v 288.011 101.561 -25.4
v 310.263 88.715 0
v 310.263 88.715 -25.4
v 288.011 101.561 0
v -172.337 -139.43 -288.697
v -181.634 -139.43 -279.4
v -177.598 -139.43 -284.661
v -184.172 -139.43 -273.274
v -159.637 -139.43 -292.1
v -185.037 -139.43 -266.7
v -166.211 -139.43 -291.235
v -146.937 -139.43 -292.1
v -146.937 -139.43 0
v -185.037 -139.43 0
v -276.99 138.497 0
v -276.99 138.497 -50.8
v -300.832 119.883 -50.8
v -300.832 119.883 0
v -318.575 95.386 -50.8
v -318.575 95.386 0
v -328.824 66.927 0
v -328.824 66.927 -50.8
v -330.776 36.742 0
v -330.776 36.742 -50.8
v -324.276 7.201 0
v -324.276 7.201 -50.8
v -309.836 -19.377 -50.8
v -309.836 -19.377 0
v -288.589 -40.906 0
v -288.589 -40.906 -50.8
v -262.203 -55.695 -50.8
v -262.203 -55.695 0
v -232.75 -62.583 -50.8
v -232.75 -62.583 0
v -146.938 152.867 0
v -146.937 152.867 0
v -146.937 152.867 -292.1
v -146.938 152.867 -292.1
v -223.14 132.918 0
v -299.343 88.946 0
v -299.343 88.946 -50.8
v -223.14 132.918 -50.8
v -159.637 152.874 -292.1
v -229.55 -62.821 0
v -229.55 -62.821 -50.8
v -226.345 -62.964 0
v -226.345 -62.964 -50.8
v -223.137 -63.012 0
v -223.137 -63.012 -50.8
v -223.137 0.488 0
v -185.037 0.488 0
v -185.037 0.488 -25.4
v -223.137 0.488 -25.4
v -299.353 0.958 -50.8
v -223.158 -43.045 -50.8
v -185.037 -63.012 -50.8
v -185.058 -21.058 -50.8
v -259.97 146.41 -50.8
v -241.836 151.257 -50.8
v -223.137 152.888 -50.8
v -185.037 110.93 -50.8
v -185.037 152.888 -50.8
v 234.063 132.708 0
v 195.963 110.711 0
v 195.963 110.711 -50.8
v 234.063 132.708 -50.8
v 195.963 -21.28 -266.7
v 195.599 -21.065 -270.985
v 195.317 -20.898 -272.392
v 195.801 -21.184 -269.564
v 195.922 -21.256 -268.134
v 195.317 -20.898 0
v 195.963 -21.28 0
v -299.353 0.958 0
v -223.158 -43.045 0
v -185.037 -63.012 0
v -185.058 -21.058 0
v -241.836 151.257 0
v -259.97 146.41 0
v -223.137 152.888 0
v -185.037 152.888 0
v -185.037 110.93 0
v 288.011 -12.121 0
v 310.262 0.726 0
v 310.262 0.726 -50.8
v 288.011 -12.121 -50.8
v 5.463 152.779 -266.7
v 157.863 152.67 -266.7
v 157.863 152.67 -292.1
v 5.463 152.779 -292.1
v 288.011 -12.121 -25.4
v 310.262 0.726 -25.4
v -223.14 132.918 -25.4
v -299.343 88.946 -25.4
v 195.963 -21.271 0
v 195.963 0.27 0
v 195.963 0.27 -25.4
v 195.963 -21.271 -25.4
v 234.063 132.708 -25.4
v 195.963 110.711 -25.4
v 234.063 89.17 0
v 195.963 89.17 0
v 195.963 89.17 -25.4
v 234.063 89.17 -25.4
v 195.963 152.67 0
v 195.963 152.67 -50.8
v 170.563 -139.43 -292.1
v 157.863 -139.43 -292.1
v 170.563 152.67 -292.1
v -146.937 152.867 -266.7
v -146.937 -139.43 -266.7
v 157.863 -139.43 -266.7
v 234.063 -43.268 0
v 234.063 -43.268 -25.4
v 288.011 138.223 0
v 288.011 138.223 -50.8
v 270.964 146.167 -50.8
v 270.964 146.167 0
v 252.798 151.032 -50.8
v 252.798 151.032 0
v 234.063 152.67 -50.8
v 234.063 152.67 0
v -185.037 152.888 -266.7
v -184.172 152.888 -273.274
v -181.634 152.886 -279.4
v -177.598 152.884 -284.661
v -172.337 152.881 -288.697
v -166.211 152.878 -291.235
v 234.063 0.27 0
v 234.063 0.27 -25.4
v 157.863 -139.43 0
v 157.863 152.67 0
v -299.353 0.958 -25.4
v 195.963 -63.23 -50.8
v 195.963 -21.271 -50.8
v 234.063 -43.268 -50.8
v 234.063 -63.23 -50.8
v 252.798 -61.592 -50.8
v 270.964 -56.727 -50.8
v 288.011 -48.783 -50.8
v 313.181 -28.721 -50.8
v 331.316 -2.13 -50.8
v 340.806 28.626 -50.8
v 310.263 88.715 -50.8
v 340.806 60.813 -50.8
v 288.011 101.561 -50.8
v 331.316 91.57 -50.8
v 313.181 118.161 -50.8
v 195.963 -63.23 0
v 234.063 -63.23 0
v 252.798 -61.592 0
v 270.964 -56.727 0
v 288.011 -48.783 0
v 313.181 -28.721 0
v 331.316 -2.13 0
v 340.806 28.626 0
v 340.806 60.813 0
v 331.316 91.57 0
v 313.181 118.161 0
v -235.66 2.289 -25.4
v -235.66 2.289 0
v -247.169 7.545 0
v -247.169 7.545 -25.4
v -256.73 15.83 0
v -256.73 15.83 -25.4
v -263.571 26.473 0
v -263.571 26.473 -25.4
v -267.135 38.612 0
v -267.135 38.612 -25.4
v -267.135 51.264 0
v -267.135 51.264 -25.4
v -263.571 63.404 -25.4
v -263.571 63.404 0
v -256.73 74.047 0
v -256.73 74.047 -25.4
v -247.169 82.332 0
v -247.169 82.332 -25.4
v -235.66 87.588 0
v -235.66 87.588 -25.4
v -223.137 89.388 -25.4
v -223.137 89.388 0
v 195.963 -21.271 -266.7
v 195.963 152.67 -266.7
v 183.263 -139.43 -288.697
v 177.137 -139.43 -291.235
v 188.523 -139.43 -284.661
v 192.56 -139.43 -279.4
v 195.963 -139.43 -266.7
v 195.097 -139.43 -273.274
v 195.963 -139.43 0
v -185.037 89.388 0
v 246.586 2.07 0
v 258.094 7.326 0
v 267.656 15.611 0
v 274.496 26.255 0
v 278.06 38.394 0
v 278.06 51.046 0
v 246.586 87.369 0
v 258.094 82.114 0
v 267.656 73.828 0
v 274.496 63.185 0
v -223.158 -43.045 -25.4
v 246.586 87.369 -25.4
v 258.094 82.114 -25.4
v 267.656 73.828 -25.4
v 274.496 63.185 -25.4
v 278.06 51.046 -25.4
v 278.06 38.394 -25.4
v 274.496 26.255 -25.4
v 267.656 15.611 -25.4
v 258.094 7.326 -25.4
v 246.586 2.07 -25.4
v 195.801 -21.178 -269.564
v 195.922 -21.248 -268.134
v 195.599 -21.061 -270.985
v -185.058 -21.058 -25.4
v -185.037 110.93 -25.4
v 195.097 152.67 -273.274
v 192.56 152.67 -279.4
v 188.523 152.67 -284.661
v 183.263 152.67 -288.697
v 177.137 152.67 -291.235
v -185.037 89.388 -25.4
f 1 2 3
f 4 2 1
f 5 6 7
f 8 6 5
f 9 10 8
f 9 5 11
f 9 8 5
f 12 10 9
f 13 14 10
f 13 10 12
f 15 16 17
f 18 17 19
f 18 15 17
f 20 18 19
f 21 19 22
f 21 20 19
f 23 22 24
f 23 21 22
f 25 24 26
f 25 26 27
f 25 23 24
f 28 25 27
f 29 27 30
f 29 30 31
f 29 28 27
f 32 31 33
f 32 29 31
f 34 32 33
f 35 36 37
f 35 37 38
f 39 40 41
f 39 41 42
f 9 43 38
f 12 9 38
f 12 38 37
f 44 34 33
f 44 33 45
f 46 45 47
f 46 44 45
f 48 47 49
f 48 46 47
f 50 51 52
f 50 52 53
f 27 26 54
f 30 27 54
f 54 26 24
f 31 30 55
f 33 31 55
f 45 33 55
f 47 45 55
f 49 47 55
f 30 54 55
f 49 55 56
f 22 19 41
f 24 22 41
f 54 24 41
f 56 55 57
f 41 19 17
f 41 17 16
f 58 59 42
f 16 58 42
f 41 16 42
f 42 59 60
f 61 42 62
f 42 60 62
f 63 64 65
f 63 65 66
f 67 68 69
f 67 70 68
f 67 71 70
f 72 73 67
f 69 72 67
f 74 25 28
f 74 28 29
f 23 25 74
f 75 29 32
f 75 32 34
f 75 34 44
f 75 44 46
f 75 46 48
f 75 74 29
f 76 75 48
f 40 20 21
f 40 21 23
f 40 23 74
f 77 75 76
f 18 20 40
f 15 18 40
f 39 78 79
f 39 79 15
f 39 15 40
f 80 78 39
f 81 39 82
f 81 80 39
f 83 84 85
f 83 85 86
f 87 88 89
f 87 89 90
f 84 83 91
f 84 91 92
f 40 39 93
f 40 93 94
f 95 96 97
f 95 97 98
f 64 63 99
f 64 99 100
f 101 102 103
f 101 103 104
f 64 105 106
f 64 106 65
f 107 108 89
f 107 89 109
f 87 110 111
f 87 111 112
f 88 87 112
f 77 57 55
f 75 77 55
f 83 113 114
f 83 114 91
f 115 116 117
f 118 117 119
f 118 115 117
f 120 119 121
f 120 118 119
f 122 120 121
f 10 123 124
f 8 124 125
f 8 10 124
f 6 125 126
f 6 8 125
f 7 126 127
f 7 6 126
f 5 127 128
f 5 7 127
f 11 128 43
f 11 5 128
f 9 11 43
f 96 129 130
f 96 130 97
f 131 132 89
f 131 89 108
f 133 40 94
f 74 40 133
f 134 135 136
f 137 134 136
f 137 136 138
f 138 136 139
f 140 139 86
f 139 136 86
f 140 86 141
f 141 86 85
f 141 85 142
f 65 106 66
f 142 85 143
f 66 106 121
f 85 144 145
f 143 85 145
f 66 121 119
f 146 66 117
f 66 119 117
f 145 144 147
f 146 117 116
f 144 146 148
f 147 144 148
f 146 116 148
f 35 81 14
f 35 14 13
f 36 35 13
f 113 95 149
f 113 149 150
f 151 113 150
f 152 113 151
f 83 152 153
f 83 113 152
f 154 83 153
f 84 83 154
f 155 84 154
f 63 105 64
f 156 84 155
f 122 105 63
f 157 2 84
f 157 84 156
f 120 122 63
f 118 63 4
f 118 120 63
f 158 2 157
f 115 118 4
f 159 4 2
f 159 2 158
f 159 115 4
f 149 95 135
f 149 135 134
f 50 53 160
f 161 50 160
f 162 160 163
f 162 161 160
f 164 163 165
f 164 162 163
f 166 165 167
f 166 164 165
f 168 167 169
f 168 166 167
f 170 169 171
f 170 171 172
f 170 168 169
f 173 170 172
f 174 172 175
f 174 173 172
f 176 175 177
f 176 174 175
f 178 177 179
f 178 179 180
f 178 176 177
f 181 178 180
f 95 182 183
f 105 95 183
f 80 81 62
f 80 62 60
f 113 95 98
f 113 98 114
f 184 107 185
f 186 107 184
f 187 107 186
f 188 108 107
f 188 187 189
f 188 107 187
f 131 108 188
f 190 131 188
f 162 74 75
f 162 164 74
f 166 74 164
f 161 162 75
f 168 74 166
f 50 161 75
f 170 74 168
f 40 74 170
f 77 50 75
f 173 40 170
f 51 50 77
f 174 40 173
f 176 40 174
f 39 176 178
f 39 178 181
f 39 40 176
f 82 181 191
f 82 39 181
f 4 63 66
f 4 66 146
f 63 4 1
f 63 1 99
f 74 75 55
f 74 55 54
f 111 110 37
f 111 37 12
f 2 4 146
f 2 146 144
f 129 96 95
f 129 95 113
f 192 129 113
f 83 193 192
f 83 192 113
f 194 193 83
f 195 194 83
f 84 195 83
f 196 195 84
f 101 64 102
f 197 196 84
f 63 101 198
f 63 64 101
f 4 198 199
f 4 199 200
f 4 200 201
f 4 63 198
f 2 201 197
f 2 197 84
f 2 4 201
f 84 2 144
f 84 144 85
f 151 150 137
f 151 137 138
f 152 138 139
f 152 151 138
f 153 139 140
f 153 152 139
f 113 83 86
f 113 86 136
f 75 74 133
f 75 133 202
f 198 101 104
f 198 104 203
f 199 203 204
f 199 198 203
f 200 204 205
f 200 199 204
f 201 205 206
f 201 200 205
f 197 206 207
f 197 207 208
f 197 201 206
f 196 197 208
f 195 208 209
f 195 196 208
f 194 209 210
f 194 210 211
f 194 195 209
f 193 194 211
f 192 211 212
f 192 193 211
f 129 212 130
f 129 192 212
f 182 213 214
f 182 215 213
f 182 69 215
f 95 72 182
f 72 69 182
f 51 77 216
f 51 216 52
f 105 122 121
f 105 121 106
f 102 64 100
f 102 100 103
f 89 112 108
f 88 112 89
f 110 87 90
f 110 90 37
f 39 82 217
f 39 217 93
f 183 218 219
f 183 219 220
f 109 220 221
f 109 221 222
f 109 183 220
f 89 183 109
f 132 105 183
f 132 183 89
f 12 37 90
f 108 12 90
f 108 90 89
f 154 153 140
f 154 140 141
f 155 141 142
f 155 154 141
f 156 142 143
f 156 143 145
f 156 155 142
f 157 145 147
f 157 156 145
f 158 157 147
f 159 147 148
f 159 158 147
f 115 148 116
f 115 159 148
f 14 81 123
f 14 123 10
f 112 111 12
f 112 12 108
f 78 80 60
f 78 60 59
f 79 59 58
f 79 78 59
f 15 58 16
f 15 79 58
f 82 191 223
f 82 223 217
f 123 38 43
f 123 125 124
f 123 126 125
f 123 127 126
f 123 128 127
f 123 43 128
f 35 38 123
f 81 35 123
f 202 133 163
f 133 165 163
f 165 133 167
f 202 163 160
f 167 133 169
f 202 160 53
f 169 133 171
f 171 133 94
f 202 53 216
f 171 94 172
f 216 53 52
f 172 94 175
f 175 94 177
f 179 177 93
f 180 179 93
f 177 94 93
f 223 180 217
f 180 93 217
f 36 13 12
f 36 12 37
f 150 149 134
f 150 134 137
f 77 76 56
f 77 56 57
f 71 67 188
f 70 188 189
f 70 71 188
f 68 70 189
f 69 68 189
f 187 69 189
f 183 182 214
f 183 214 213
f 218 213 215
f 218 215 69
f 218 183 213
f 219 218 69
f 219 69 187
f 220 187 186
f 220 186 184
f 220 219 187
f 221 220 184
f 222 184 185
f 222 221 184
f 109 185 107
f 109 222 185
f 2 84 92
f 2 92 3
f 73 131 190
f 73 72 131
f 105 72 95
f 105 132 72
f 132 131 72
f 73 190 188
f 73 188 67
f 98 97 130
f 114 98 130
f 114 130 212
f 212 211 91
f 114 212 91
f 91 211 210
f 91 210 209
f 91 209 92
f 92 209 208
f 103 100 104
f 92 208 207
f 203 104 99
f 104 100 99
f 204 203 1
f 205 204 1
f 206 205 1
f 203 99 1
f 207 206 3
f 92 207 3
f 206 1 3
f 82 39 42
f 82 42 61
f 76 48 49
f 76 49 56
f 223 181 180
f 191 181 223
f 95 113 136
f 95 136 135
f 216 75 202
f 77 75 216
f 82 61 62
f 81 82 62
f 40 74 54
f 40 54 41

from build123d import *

# Parameters (mm, degrees)
F1_DEPTH = 292.1
F2_DEPTH = 292.1
F3_DEPTH = 50.8
F4_DEPTH = 25.4
F5_DEPTH = 266.7
F6_R     = 25.4
F7_F1_R  = 25.4


with BuildPart() as f1:
    # F0 (on Top) → F1 (new body)
    with BuildSketch(Plane.XY):
        Polygon((-146.9373597216, 152.8665271591), (-146.9381408057, 152.866527607), (-185.0373597216, 152.8883730943), (-185.0373597216, 110.9295088627), (-185.0373597216, 89.3883730943), (-185.0373597216, 0.4883730943), (-185.0373597216, -63.0116269057), (-185.0373597216, -139.4300862217), (-146.9373597216, -139.4300862217), (-146.9373597216, 44.938373096), align=None)
    extrude(amount=-F1_DEPTH)

    # F6
    f6_edges = [f1.edges().sort_by_distance(p)[0] for p in [
        (-185.03736, 6.729143, -292.1),
    ]]
    fillet(f6_edges, radius=F6_R)


with BuildPart() as f1b:
    # F0 (on Top) → F1, piece 2 (new body)
    with BuildSketch(Plane.XY):
        Polygon((195.9625776479, 152.6699137783), (157.8625776479, 152.6699137783), (157.8625776479, 88.7140042905), (157.8625776479, 45.4657096237), (157.8625776479, 0.725823266), (157.8625776479, -139.4300862217), (195.9625776479, -139.4300862217), (195.9625776479, -63.2300862217), (195.9625776479, -21.2796984665), (195.3166993516, -20.89832398), (195.9625776479, -21.2712219881), (195.9625776479, 0.2699137783), (195.9625776479, 89.1699137783), (195.9625776479, 110.7110495466), align=None)
    extrude(amount=-F1_DEPTH)

    # F7: fillet of radius 25.4 on 2 edges, made by hand

    # F7_f1
    f7_f1_edges = [f1b.edges().sort_by_distance(p)[0] for p in [
        (195.9625776479, 65.6993458951, -292.1),
    ]]
    fillet(f7_f1_edges, radius=F7_F1_R)


with BuildPart() as f2:
    # F0 (on Top) → F2 (new body)
    with BuildSketch(Plane.XY):
        Polygon((157.8625776479, 152.6699137783), (5.4626084624, 152.7791434367), (-146.9373597216, 152.8665271591), (-146.9373597216, 44.938373096), (-146.9373597216, -139.4300862217), (157.8625776479, -139.4300862217), (157.8625776479, 0.725823266), (157.8625776479, 45.4657096237), (157.8625776479, 88.7140042905), align=None)
    extrude(amount=-F2_DEPTH)

    # F0 (on Top) → F5 (cut)
    with BuildSketch(Plane.XY):
        Polygon((157.8625776479, 152.6699137783), (5.4626084624, 152.7791434367), (-146.9373597216, 152.8665271591), (-146.9373597216, 44.938373096), (-146.9373597216, -139.4300862217), (157.8625776479, -139.4300862217), (157.8625776479, 0.725823266), (157.8625776479, 45.4657096237), (157.8625776479, 88.7140042905), align=None)
    extrude(amount=-F5_DEPTH, mode=Mode.SUBTRACT)


with BuildPart() as f3:
    # F0 (on Top) → F3 (new body)
    with BuildSketch(Plane.XY):
        with BuildLine():
            Line((-276.9895869982, 101.8443908913), (-276.9895869982, 138.4965908913))
            ThreePointArc((-276.9895869982, 138.4965908913), (-331.0873597064, 44.9401852075), (-276.9927280161, -48.6180366586))
            Line((-276.9927280161, -48.6180366586), (-276.9927280161, -11.954959134))
            Line((-276.9927280161, -11.954959134), (-299.3526036167, 0.9578911619))
            Line((-299.3526036167, 0.9578911619), (-299.3428364707, 88.9455391374))
            Line((-299.3428364707, 88.9455391374), (-276.9895869982, 101.8443908913))
        make_face()
        with BuildLine():
            Line((-185.0373597216, 110.9295088627), (-185.0373597216, 152.8883730943))
            Line((-185.0373597216, 152.8883730943), (-223.1373597216, 152.8883730943))
            ThreePointArc((-223.1373597216, 152.8883730943), (-251.0084279539, 149.2283824701), (-276.9895869982, 138.4965908913))
            Line((-276.9895869982, 138.4965908913), (-276.9895869982, 101.8443908913))
            Line((-276.9895869982, 101.8443908913), (-223.1400223154, 132.9180633213))
            Line((-223.1400223154, 132.9180633213), (-185.0373597216, 110.9295088627))
        make_face()
        with BuildLine():
            Line((-276.9927280161, -11.954959134), (-276.9927280161, -48.6180366586))
            ThreePointArc((-276.9927280161, -48.6180366586), (-255.6304137058, -58.0053199751), (-232.7499348539, -62.5827917958))
            ThreePointArc((-232.7499348539, -62.5827917958), (-227.9484276962, -62.9043648389), (-223.1373597216, -63.0116269057))
            Line((-223.1373597216, -63.0116269057), (-185.0373597216, -63.0116269057))
            Line((-185.0373597216, -63.0116269057), (-185.0583889285, -21.0581061103))
            Line((-185.0583889285, -21.0581061103), (-223.1575768981, -43.0448122021))
            Line((-223.1575768981, -43.0448122021), (-276.9927280161, -11.954959134))
        make_face()
    extrude(amount=-F3_DEPTH)


with BuildPart() as f3b:
    # F0 (on Top) → F3, piece 2 (new body)
    with BuildSketch(Plane.XY):
        with BuildLine():
            ThreePointArc((234.0625776479, -63.2300862217), (261.9872194499, -59.5557635402), (288.0109044248, -48.7829232802))
            Line((288.0109044248, -48.7829232802), (288.0109044248, -12.1207826238))
            Line((288.0109044248, -12.1207826238), (234.0625776496, -43.2682672433))
            Line((234.0625776496, -43.2682672433), (195.9625776479, -21.2712219881))
            Line((195.9625776479, -21.2712219881), (195.9625776479, -21.2796984665))
            Line((195.9625776479, -21.2796984665), (195.9625776479, -63.2300862217))
            Line((195.9625776479, -63.2300862217), (234.0625776479, -63.2300862217))
        make_face()
        with BuildLine():
            ThreePointArc((288.0109044248, -48.7829232802), (342.0125776479, 44.7199137783), (288.0109044248, 138.2227508367))
            Line((288.0109044248, 138.2227508367), (288.0109044248, 101.5614174512))
            Line((288.0109044248, 101.5614174512), (310.2626497377, 88.71453279))
            Line((310.2626497377, 88.71453279), (310.2624181697, 0.7263013092))
            Line((310.2624181697, 0.7263013092), (288.0109044248, -12.1207826238))
            Line((288.0109044248, -12.1207826238), (288.0109044248, -48.7829232802))
        make_face()
        with BuildLine():
            Line((234.0625776479, 152.6699137783), (195.9625776479, 152.6699137783))
            Line((195.9625776479, 152.6699137783), (195.9625776479, 110.7110495466))
            Line((195.9625776479, 110.7110495466), (234.0625776479, 132.7080948028))
            Line((234.0625776479, 132.7080948028), (288.0109044248, 101.5614174512))
            Line((288.0109044248, 101.5614174512), (288.0109044248, 138.2227508367))
            ThreePointArc((288.0109044248, 138.2227508367), (261.9872194499, 148.9955910967), (234.0625776479, 152.6699137783))
        make_face()
    extrude(amount=-F3_DEPTH)


with BuildPart() as f4:
    # F0 (on Top) → F4 (new body)
    with BuildSketch(Plane.XY):
        with BuildLine():
            Line((234.0625776479, 132.7080948028), (195.9625776479, 110.7110495466))
            Line((195.9625776479, 110.7110495466), (195.9625776479, 89.1699137783))
            Line((195.9625776479, 89.1699137783), (234.0625776479, 89.1699137783))
            ThreePointArc((234.0625776479, 89.1699137783), (278.5125776479, 44.7199137783), (234.0625776479, 0.2699137783))
            Line((234.0625776479, 0.2699137783), (195.9625776479, 0.2699137783))
            Line((195.9625776479, 0.2699137783), (195.9625776479, -21.2712219881))
            Line((195.9625776479, -21.2712219881), (234.0625776496, -43.2682672433))
            Line((234.0625776496, -43.2682672433), (288.0109044248, -12.1207826238))
            Line((288.0109044248, -12.1207826238), (310.2624181697, 0.7263013092))
            Line((310.2624181697, 0.7263013092), (310.2626497377, 88.71453279))
            Line((310.2626497377, 88.71453279), (288.0109044248, 101.5614174512))
            Line((288.0109044248, 101.5614174512), (234.0625776479, 132.7080948028))
        make_face()
    extrude(amount=-F4_DEPTH)


with BuildPart() as f4b:
    # F0 (on Top) → F4, piece 2 (new body)
    with BuildSketch(Plane.XY):
        with BuildLine():
            Line((-185.0373597216, 89.3883730943), (-185.0373597216, 110.9295088627))
            Line((-185.0373597216, 110.9295088627), (-223.1400223154, 132.9180633213))
            Line((-223.1400223154, 132.9180633213), (-276.9895869982, 101.8443908913))
            Line((-276.9895869982, 101.8443908913), (-299.3428364707, 88.9455391374))
            Line((-299.3428364707, 88.9455391374), (-299.3526036167, 0.9578911619))
            Line((-299.3526036167, 0.9578911619), (-276.9927280161, -11.954959134))
            Line((-276.9927280161, -11.954959134), (-223.1575768981, -43.0448122021))
            Line((-223.1575768981, -43.0448122021), (-185.0583889285, -21.0581061103))
            Line((-185.0583889285, -21.0581061103), (-185.0373597216, 0.4883730943))
            Line((-185.0373597216, 0.4883730943), (-223.1373597216, 0.4883730943))
            ThreePointArc((-223.1373597216, 0.4883730943), (-267.5873597216, 44.9383730943), (-223.1373597216, 89.3883730943))
            Line((-223.1373597216, 89.3883730943), (-185.0373597216, 89.3883730943))
        make_face()
    extrude(amount=-F4_DEPTH)


solid = Compound([f1.part, f1b.part, f2.part, f3.part, f3b.part, f4.part, f4b.part])
